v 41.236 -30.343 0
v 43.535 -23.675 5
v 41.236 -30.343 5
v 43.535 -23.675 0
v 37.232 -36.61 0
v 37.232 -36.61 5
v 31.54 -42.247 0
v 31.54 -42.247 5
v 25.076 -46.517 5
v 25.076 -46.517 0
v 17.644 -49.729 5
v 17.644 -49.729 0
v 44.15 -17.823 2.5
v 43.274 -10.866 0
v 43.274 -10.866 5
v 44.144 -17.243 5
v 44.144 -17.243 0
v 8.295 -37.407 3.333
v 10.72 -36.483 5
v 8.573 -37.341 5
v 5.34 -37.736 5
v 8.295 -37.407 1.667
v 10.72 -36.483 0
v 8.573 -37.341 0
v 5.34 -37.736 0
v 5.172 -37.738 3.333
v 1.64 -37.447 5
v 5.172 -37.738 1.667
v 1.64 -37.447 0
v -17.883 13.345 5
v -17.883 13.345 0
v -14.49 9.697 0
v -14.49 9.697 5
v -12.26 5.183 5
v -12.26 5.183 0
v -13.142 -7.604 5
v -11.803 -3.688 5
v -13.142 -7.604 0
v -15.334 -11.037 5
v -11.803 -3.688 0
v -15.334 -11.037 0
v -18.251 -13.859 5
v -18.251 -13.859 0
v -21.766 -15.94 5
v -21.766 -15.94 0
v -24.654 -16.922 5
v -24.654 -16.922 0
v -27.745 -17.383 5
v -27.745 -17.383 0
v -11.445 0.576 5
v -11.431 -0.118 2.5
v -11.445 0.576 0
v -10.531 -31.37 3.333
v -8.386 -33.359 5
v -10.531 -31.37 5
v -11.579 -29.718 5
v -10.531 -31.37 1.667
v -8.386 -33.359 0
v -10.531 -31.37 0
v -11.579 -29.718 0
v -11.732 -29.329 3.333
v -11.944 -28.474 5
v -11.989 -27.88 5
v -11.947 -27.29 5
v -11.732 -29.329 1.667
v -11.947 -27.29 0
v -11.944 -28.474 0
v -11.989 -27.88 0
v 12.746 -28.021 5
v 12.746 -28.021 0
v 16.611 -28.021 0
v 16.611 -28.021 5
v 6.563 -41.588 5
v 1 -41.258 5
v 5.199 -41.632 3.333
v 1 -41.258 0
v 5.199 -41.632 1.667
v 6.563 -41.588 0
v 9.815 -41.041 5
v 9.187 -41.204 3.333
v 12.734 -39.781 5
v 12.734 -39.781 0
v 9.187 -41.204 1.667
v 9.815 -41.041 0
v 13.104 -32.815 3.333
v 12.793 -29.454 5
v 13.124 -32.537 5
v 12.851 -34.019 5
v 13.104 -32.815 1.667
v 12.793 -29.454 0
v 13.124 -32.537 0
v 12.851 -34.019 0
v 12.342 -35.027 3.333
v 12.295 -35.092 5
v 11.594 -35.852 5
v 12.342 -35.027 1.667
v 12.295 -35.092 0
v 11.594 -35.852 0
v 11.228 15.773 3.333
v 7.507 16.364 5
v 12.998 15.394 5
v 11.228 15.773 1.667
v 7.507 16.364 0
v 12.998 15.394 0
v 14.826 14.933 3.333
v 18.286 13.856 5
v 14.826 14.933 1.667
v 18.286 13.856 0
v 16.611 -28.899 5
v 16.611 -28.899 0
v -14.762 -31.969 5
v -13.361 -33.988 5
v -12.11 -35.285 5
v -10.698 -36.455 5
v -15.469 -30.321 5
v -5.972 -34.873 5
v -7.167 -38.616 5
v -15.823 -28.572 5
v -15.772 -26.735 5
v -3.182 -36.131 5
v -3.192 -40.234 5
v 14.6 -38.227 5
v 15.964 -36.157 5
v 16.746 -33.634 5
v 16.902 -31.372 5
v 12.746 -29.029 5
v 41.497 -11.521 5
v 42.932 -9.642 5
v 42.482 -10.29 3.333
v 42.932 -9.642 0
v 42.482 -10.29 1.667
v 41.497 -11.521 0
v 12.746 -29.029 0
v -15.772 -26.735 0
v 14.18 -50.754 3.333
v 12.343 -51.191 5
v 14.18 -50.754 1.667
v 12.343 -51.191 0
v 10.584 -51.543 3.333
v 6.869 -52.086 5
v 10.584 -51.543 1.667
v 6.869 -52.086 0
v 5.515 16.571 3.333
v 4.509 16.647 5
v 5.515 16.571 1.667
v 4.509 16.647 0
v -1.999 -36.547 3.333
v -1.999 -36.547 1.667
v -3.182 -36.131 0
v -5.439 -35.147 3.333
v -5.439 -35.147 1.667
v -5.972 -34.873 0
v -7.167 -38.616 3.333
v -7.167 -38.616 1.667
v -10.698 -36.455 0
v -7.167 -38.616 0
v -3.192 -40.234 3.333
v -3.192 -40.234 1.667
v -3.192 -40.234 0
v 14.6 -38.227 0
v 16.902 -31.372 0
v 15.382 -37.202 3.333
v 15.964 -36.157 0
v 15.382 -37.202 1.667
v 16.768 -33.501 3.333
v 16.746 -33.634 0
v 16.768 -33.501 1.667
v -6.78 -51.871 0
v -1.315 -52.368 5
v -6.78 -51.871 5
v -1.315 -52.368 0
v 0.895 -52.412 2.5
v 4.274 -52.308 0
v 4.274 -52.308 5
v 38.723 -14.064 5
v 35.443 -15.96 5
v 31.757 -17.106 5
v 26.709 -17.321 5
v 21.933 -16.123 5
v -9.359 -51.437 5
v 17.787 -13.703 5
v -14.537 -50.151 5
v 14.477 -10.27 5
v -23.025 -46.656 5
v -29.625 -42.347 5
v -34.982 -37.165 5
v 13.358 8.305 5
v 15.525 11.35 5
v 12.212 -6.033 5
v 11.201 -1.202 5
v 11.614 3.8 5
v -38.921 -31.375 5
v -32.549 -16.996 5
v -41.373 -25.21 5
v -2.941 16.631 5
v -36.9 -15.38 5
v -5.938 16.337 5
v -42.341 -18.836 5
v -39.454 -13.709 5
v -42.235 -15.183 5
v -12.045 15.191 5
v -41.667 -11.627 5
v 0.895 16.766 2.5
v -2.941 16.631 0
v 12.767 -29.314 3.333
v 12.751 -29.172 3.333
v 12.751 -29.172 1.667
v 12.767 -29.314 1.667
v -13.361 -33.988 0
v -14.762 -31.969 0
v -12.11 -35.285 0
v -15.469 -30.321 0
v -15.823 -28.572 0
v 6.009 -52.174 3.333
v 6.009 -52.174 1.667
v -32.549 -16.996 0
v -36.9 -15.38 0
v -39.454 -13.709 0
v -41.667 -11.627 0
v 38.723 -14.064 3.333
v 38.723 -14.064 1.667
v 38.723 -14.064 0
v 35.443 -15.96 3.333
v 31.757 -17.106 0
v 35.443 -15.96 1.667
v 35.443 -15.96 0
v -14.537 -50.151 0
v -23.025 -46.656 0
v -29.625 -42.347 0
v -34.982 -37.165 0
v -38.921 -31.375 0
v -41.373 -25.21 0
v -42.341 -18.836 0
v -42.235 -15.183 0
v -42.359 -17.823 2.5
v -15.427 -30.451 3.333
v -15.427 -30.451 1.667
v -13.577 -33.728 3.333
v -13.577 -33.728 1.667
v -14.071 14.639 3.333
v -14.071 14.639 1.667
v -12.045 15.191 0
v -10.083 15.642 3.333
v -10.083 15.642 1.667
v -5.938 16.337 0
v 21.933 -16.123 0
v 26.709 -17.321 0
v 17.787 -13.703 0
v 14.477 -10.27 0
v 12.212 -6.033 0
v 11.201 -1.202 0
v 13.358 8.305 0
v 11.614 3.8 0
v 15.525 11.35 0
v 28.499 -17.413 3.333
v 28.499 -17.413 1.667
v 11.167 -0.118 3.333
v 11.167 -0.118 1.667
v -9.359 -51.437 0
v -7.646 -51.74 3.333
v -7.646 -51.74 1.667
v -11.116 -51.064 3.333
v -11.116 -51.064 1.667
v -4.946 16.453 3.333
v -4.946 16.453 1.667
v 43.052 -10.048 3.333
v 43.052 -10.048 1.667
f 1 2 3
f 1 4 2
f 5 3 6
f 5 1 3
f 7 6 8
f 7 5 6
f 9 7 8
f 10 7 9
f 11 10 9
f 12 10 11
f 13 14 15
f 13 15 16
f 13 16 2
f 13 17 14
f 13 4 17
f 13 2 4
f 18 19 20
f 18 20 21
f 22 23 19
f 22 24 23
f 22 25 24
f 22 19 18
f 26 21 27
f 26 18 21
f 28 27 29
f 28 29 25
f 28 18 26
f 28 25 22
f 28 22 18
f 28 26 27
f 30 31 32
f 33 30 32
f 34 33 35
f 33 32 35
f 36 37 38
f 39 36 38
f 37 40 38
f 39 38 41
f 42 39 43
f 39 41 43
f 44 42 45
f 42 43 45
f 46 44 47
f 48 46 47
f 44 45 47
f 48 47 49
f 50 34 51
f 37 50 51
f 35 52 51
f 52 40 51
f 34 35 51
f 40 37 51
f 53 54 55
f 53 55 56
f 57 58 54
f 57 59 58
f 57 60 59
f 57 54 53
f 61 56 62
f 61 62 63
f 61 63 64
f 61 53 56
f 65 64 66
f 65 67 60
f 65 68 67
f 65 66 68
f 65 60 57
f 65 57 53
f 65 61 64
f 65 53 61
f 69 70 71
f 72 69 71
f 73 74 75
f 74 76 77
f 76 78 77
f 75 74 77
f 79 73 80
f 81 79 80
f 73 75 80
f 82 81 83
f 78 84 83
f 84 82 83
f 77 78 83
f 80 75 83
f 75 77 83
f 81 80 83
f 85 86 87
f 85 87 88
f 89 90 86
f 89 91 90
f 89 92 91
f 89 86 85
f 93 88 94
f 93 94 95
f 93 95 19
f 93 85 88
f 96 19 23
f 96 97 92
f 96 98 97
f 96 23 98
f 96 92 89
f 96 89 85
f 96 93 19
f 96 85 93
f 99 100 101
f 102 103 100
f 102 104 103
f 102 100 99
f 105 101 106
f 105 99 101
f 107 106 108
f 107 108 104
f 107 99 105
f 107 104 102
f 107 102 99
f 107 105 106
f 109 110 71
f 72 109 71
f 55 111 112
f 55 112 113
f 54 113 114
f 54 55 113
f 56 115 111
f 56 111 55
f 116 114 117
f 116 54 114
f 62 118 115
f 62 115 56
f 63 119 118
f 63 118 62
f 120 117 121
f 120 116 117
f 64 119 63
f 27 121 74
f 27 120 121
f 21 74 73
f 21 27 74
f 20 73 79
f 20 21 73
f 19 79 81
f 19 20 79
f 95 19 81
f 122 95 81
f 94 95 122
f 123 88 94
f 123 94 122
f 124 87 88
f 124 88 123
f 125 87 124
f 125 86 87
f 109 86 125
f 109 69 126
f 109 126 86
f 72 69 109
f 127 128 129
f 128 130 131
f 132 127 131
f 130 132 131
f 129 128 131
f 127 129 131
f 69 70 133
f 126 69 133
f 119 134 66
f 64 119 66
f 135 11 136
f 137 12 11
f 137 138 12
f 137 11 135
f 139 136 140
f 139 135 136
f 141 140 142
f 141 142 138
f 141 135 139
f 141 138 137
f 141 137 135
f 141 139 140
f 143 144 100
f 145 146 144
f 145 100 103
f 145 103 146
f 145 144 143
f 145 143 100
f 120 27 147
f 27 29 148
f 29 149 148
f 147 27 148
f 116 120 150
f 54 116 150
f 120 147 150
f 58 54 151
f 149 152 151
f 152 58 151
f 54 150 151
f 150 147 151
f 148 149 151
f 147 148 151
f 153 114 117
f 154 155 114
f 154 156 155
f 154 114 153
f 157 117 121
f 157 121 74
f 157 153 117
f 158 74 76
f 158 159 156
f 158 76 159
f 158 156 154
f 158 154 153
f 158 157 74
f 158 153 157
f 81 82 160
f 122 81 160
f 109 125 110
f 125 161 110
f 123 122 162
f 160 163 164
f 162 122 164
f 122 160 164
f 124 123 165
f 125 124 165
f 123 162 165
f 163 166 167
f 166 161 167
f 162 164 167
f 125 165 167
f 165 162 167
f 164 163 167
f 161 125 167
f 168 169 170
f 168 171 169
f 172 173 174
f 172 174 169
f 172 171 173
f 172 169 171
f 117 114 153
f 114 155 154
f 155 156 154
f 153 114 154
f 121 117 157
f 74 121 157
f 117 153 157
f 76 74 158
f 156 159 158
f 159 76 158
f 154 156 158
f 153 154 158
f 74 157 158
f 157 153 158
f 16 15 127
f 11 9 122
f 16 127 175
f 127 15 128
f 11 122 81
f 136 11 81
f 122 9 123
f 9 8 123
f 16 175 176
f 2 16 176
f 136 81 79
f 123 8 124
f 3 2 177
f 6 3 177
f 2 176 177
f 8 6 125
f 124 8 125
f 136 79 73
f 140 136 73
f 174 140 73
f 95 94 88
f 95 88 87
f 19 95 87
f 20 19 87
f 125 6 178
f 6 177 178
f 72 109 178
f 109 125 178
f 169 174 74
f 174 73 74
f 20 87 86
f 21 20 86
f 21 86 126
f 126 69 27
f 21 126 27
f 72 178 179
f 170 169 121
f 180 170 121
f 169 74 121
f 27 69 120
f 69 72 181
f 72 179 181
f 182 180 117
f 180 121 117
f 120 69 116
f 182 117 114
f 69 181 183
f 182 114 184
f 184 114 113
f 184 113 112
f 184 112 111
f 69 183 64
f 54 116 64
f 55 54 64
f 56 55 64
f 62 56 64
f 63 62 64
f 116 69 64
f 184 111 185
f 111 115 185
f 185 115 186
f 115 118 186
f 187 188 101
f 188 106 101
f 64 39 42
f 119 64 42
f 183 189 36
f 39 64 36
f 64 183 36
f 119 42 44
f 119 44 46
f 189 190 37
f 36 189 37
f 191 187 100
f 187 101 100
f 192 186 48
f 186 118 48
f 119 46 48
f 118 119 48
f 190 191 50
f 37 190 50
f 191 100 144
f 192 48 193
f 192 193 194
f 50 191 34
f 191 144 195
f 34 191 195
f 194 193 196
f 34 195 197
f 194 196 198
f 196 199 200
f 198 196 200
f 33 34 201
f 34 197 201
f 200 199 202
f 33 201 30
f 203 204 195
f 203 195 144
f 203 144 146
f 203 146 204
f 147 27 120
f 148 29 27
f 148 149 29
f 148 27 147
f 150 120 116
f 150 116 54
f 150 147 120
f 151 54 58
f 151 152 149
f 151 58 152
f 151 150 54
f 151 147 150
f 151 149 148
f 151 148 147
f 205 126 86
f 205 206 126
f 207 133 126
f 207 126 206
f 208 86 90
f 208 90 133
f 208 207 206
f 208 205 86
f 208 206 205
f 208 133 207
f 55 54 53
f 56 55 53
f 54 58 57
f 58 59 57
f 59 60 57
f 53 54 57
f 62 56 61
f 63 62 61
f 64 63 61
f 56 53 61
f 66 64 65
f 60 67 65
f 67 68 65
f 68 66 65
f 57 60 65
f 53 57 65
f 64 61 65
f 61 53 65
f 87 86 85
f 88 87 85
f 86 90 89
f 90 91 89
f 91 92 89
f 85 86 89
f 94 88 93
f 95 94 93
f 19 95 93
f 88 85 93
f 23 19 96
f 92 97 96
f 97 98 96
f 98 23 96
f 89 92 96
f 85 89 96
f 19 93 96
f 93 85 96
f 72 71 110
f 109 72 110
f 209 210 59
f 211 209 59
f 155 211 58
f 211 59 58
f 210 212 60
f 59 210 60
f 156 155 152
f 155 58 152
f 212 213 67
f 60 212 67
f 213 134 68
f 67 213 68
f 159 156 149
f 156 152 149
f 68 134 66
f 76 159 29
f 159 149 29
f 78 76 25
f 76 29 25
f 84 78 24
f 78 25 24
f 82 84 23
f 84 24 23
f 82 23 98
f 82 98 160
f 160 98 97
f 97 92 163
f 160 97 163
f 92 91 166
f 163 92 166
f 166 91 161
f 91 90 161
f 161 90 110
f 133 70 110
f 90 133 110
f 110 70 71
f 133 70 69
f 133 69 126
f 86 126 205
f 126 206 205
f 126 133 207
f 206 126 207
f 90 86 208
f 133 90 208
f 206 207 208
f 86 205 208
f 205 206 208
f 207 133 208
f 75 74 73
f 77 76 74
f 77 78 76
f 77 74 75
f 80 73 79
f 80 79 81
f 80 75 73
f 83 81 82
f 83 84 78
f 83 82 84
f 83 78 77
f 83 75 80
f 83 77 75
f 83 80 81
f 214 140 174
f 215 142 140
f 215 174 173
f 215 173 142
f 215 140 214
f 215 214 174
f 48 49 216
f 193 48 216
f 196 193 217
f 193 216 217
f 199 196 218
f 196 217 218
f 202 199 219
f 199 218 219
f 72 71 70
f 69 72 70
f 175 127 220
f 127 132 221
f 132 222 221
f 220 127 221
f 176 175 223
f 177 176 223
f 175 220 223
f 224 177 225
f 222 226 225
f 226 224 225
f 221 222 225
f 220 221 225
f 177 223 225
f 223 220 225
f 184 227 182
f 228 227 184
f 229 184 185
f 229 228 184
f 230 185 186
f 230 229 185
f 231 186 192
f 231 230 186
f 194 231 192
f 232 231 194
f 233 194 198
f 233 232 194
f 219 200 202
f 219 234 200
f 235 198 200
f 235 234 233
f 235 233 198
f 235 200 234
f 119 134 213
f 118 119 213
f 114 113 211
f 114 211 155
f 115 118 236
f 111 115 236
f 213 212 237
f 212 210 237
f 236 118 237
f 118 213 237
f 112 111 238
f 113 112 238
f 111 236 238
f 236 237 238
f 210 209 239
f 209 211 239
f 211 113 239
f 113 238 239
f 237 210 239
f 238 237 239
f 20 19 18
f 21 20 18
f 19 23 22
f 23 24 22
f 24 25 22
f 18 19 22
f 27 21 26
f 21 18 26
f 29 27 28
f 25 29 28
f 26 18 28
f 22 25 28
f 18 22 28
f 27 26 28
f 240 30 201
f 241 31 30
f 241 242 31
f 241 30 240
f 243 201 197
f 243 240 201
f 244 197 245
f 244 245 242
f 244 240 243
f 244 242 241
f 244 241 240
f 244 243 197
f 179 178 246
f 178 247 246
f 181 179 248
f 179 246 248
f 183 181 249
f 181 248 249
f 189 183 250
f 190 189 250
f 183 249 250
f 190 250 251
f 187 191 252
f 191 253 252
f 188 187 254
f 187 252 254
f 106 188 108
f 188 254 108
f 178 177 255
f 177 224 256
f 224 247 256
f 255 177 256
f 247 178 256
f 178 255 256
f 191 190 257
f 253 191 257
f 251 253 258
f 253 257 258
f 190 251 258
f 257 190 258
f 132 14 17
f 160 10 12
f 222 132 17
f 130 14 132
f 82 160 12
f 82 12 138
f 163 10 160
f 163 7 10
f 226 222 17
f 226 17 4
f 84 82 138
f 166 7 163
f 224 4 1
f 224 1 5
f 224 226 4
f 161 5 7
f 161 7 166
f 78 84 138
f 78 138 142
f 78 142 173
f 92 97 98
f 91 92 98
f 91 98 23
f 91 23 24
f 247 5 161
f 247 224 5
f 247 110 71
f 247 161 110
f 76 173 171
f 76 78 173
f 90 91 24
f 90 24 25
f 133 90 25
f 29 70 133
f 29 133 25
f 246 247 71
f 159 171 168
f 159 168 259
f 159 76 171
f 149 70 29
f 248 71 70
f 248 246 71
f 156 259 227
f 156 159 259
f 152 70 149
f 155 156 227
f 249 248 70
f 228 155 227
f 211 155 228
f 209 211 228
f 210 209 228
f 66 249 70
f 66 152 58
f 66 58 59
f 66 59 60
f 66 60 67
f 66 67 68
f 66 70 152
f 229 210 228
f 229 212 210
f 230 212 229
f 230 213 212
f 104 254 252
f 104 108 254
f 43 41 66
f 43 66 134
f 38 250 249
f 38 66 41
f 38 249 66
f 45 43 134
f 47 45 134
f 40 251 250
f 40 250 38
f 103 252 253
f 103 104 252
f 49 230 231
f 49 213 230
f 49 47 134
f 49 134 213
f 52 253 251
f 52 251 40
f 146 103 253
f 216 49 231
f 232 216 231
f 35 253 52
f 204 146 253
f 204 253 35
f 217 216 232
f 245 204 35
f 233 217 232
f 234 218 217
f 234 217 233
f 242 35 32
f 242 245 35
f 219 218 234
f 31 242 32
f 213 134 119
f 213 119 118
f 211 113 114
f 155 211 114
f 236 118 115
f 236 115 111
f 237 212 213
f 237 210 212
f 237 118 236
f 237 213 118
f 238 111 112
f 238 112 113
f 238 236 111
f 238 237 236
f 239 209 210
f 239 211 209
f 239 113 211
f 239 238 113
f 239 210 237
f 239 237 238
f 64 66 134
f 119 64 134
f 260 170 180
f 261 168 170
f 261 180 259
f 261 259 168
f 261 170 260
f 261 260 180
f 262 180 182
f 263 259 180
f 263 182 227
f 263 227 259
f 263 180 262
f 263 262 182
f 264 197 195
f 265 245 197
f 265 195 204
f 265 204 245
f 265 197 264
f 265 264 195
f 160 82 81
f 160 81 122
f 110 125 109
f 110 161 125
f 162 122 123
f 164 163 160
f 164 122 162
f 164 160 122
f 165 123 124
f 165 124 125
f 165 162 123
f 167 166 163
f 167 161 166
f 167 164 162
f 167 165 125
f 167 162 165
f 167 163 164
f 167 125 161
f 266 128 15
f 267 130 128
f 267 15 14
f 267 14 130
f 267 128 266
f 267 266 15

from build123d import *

# Parameters (mm, degrees)
F1_DEPTH = 5
F2_DEPTH = 5


with BuildPart() as f1:
    # F0 (on Top) → F1 (new body)
    with BuildSketch(Plane.XY):
        with BuildLine():
            add(Edge.make_bspline(
                [(12.734443, -39.781365), (15.920232, -37.835476), (17.632841, -33.879291), (16.61114, -28.898724)],
                knots=[0, 0, 0, 0, 1, 1, 1, 1], degree=3))
            Line((16.61114, -28.898724), (16.61114, -28.020637))
            Line((16.61114, -28.020637), (12.746019, -28.020637))
            add(Edge.make_bspline(
                [(12.746019, -28.020637), (12.746019, -28.0208513466), (12.746019, -28.0210702537), (12.746019, -28.0378303299), (12.746019, -28.3570972405), (12.746019, -28.6929007595), (12.746019, -29.0121676701), (12.746019, -29.0289277463), (12.746019, -29.0291466534), (12.746019, -29.029361)],
                knots=[0, 0, 0, 0, 0.0006430397, 0.0006567214, 0.0502802287, 0.9584437713, 1.0080672786, 1.0080809603, 1.008724, 1.008724, 1.008724, 1.008724], degree=3))
            add(Edge.make_bspline(
                [(12.746019, -29.029361), (12.74605, -29.172341), (12.761948, -29.314876), (12.793421, -29.454349)],
                knots=[0, 0, 0, 0, 1, 1, 1, 1], degree=3))
            add(Edge.make_bspline(
                [(12.793421, -29.454349), (13.710785, -33.520561), (12.70048, -35.27361), (10.719751, -36.483446)],
                knots=[0, 0, 0, 0, 1, 1, 1, 1], degree=3))
            add(Edge.make_bspline(
                [(10.719751, -36.483446), (8.739023, -37.693279), (5.281256, -38.058505), (1.640132, -37.446969)],
                knots=[0, 0, 0, 0, 1, 1, 1, 1], degree=3))
            add(Edge.make_bspline(
                [(1.640132, -37.446969), (-2.000989, -36.835433), (-5.782567, -35.302924), (-8.385923, -33.358605)],
                knots=[0, 0, 0, 0, 1, 1, 1, 1], degree=3))
            add(Edge.make_bspline(
                [(-8.385923, -33.358605), (-10.989276, -31.414286), (-12.239972, -29.310328), (-11.946774, -27.289724)],
                knots=[0, 0, 0, 0, 1, 1, 1, 1], degree=3))
            Line((-11.946774, -27.289724), (-15.771656, -26.734652))
            add(Edge.make_bspline(
                [(-15.771656, -26.734652), (-16.337542, -30.634506), (-13.932498, -34.039847), (-10.698271, -36.455334)],
                knots=[0, 0, 0, 0, 1, 1, 1, 1], degree=3))
            add(Edge.make_bspline(
                [(-10.698271, -36.455334), (-7.464044, -38.870817), (-3.226178, -40.548244), (1.00017, -41.25807)],
                knots=[0, 0, 0, 0, 1, 1, 1, 1], degree=3))
            add(Edge.make_bspline(
                [(1.00017, -41.25807), (5.226522, -41.967898), (9.484578, -41.766392), (12.734443, -39.781365)],
                knots=[0, 0, 0, 0, 1, 1, 1, 1], degree=3))
        make_face()
    extrude(amount=F1_DEPTH)


with BuildPart() as f1b:
    # F0 (on Top) → F1, piece 2 (new body)
    with BuildSketch(Plane.XY):
        with BuildLine():
            add(Edge.make_bspline(
                [(-27.7454914934, -17.3831615798), (-25.4848622372, -19.2736486235), (-23.4287961137, -21.451514347), (-21.6284719984, -23.9119219826)],
                knots=[0.8661202793, 0.8661202793, 0.8661202793, 0.8661202793, 1, 1, 1, 1], degree=3))
            add(Edge.make_bspline(
                [(-27.7454914981, -17.3831615977), (-28.0822081964, -17.4027131688), (-28.4214851444, -17.412626), (-28.76305, -17.412626)],
                knots=[0.9642809302, 0.9642809302, 0.9642809302, 0.9642809302, 1, 1, 1, 1], degree=3))
            add(Edge.make_bspline(
                [(-28.7630500014, -17.4126260018), (-33.8960829139, -17.4126260018), (-38.5015979977, -15.1739896926), (-41.6668967581, -11.6268322113)],
                knots=[0, 0, 0, 0, 0.5367857347, 0.5367857347, 0.5367857347, 0.5367857347], degree=3))
            add(Edge.make_bspline(
                [(-42.3593879972, -17.8232599981), (-42.3593879972, -15.70835477), (-42.1218509095, -13.6374762635), (-41.6668967569, -11.6268322116)],
                knots=[0, 0, 0, 0, 0.1108003269, 0.1108003269, 0.1108003269, 0.1108003269], degree=3))
            add(Edge.make_bspline(
                [(-14.5369517464, -50.1506168986), (-30.8120747848, -45.1875138054), (-42.359388, -32.5977476883), (-42.359388, -17.82326)],
                knots=[0.2274692045, 0.2274692045, 0.2274692045, 0.2274692045, 1, 1, 1, 1], degree=3))
            add(Edge.make_bspline(
                [(-21.628472002, -23.9119220042), (-15.9783217735, -31.6281219583), (-13.7253066716, -40.8854651209), (-14.5369517491, -50.1506168989)],
                knots=[0, 0, 0, 0, 0.4190171031, 0.4190171031, 0.4190171031, 0.4190171031], degree=3))
        make_face()
    extrude(amount=F1_DEPTH)



with BuildPart() as f1c:
    # F0 (on Top) → F1, piece 3 (new body)
    with BuildSketch(Plane.XY):
        with BuildLine():
            add(Edge.make_bspline(
                [(41.496607571, -11.5207741803), (39.0096189113, -14.3537933789), (35.6115250768, -16.3700235375), (31.7572682547, -17.1057755436)],
                knots=[0.457889602, 0.457889602, 0.457889602, 0.457889602, 0.8834983945, 0.8834983945, 0.8834983945, 0.8834983945], degree=3))
            add(Edge.make_bspline(
                [(24.801034, -24.322837), (26.8241254465, -21.5600342644), (29.1667116086, -19.1520336904), (31.7572682547, -17.1057755436)],
                knots=[0, 0, 0, 0, 0.1500300155, 0.1500300155, 0.1500300155, 0.1500300155], degree=3))
            add(Edge.make_bspline(
                [(17.6440274537, -49.729019344), (17.0311754569, -40.7368621909), (19.3145165012, -31.800141131), (24.801034, -24.322837)],
                knots=[0.593126466, 0.593126466, 0.593126466, 0.593126466, 1, 1, 1, 1], degree=3))
            add(Edge.make_bspline(
                [(44.149908, -17.82326), (44.149908, -32.1960737794), (33.2217734232, -44.5013432134), (17.6440274514, -49.7290193437)],
                knots=[0, 0, 0, 0, 0.7515280054, 0.7515280054, 0.7515280054, 0.7515280054], degree=3))
            add(Edge.make_bspline(
                [(43.2741469204, -10.8659114346), (43.8483964355, -13.1136924153), (44.149908, -15.4405345256), (44.149908, -17.82326)],
                knots=[0.8751685145, 0.8751685145, 0.8751685145, 0.8751685145, 1, 1, 1, 1], degree=3))
            add(Edge.make_bspline(
                [(41.496607571, -11.5207741803), (42.0831921323, -11.2889186769), (42.6758725904, -11.0706148581), (43.2741469213, -10.8659114372)],
                knots=[0.3213713892, 0.3213713892, 0.3213713892, 0.3213713892, 0.3500969523, 0.3500969523, 0.3500969523, 0.3500969523], degree=3))
        make_face()
        with BuildLine():
            add(Edge.make_bspline(
                [(42.9322474575, -9.6419037564), (42.4962572948, -10.3010425075), (42.0163267182, -10.9287432049), (41.496607571, -11.5207741803)],
                knots=[0.3689478861, 0.3689478861, 0.3689478861, 0.3689478861, 0.457889602, 0.457889602, 0.457889602, 0.457889602], degree=3))
            add(Edge.make_bspline(
                [(41.496607571, -11.5207741803), (42.0831921323, -11.2889186769), (42.6758725904, -11.0706148581), (43.2741469213, -10.8659114372)],
                knots=[0.3213713892, 0.3213713892, 0.3213713892, 0.3213713892, 0.3500969523, 0.3500969523, 0.3500969523, 0.3500969523], degree=3))
            add(Edge.make_bspline(
                [(42.9322474577, -9.6419037563), (43.0552016039, -10.0471728179), (43.1692265907, -10.4552224997), (43.2741469204, -10.8659114346)],
                knots=[0.8523607274, 0.8523607274, 0.8523607274, 0.8523607274, 0.8751685145, 0.8751685145, 0.8751685145, 0.8751685145], degree=3))
        make_face()
    extrude(amount=F1_DEPTH)


with BuildPart() as f1b_1:
    add(f1b.part)

    add(f1c.part)  # F2 merges F1c
    # F0 (on Top) → F2 (join)
    with BuildSketch(Plane.XY):
        with BuildLine():
            add(Edge.make_bspline(
                [(-5.9378795005, 16.3365863681), (-4.9497466604, 16.4619585653), (-3.9504295333, 16.560578393), (-2.9411196849, 16.6314859824)],
                knots=[0.9027302545, 0.9027302545, 0.9027302545, 0.9027302545, 0.9459190297, 0.9459190297, 0.9459190297, 0.9459190297], degree=3))
            add(Edge.make_bspline(
                [(-17.8832007592, 13.3451160525), (-14.1667628508, 14.7796245747), (-10.1541337023, 15.8016369849), (-5.9378795005, 16.3365863681)],
                knots=[0.7184484983, 0.7184484983, 0.7184484983, 0.7184484983, 0.9027302545, 0.9027302545, 0.9027302545, 0.9027302545], degree=3))
            add(Edge.make_bspline(
                [(-17.8832007591, 13.3451160522), (-13.9495167672, 10.1766095439), (-11.431219, 5.3257917383), (-11.431219, -0.118331)],
                knots=[0.4306821184, 0.4306821184, 0.4306821184, 0.4306821184, 1, 1, 1, 1], degree=3))
            add(Edge.make_bspline(
                [(-11.431219, -0.118331), (-11.431219, -9.3028339682), (-18.6554034185, -16.855342504), (-27.7454914981, -17.3831615977)],
                knots=[0, 0, 0, 0, 0.9642809302, 0.9642809302, 0.9642809302, 0.9642809302], degree=3))
            add(Edge.make_bspline(
                [(-27.7454914934, -17.3831615798), (-25.4848622372, -19.2736486235), (-23.4287961137, -21.451514347), (-21.6284719984, -23.9119219826)],
                knots=[0.8661202793, 0.8661202793, 0.8661202793, 0.8661202793, 1, 1, 1, 1], degree=3))
            add(Edge.make_bspline(
                [(-21.628472002, -23.9119220042), (-15.9783217735, -31.6281219583), (-13.7253066716, -40.8854651209), (-14.5369517491, -50.1506168989)],
                knots=[0, 0, 0, 0, 0.4190171031, 0.4190171031, 0.4190171031, 0.4190171031], degree=3))
            add(Edge.make_bspline(
                [(-9.358816, -51.4367196264), (-11.1301489273, -51.0930942082), (-12.8586867056, -50.6624042685), (-14.5369517464, -50.1506168986)],
                knots=[0.1478070462, 0.1478070462, 0.1478070462, 0.1478070462, 0.2274692045, 0.2274692045, 0.2274692045, 0.2274692045], degree=3))
            add(Edge.make_bspline(
                [(-6.77968, -51.8706532523), (-7.6486983636, -51.7465029707), (-8.5086859107, -51.6016385431), (-9.358816, -51.4367196264)],
                knots=[0.1095741445, 0.1095741445, 0.1095741445, 0.1095741445, 0.1478070462, 0.1478070462, 0.1478070462, 0.1478070462], degree=3))
            add(Edge.make_bspline(
                [(0.895119, -52.412133), (-1.7243512939, -52.412133), (-4.2891040964, -52.2264635695), (-6.77968, -51.8706532523)],
                knots=[0, 0, 0, 0, 0.1095741445, 0.1095741445, 0.1095741445, 0.1095741445], degree=3))
            add(Edge.make_bspline(
                [(4.274391, -52.3084107676), (3.1593420107, -52.3771353208), (2.032387159, -52.412133), (0.895119, -52.412133)],
                knots=[0.9524273319, 0.9524273319, 0.9524273319, 0.9524273319, 1, 1, 1, 1], degree=3))
            add(Edge.make_bspline(
                [(6.8688456197, -52.0857892042), (6.0118230737, -52.1802340142), (5.1467506657, -52.2546440462), (4.274391, -52.3084107676)],
                knots=[0.9152088086, 0.9152088086, 0.9152088086, 0.9152088086, 0.9524273319, 0.9524273319, 0.9524273319, 0.9524273319], degree=3))
            add(Edge.make_bspline(
                [(17.6440274514, -49.7290193437), (14.2512357594, -50.8675933181), (10.6378865758, -51.670436821), (6.8688456197, -52.0857892042)],
                knots=[0.7515280054, 0.7515280054, 0.7515280054, 0.7515280054, 0.9152088086, 0.9152088086, 0.9152088086, 0.9152088086], degree=3))
            add(Edge.make_bspline(
                [(17.6440274537, -49.729019344), (17.0311754569, -40.7368621909), (19.3145165012, -31.800141131), (24.801034, -24.322837)],
                knots=[0.593126466, 0.593126466, 0.593126466, 0.593126466, 1, 1, 1, 1], degree=3))
            add(Edge.make_bspline(
                [(24.801034, -24.322837), (26.8241254465, -21.5600342644), (29.1667116086, -19.1520336904), (31.7572682547, -17.1057755436)],
                knots=[0, 0, 0, 0, 0.1500300155, 0.1500300155, 0.1500300155, 0.1500300155], degree=3))
            add(Edge.make_bspline(
                [(31.7572682547, -17.1057755436), (30.7022451548, -17.30717244), (29.6130427928, -17.4126260015), (28.4989919964, -17.4126260015)],
                knots=[0.8834983945, 0.8834983945, 0.8834983945, 0.8834983945, 1, 1, 1, 1], degree=3))
            add(Edge.make_bspline(
                [(28.498992, -17.412626), (18.936739, -17.412626), (11.167443, -9.643331), (11.167443, -0.118331)],
                knots=[0, 0, 0, 0, 1, 1, 1, 1], degree=3))
            add(Edge.make_bspline(
                [(11.1674430006, -0.1183309997), (11.1674430006, 5.627639161), (13.9726326914, 10.7126893493), (18.2864119041, 13.856445722)],
                knots=[0, 0, 0, 0, 0.6008835063, 0.6008835063, 0.6008835063, 0.6008835063], degree=3))
            add(Edge.make_bspline(
                [(7.5071641473, 16.3641522212), (11.2838455632, 15.9010039293), (14.8989934452, 15.0473276915), (18.2864119041, 13.8564457219)],
                knots=[0.0940532477, 0.0940532477, 0.0940532477, 0.0940532477, 0.25884533, 0.25884533, 0.25884533, 0.25884533], degree=3))
            add(Edge.make_bspline(
                [(4.5089480455, 16.6466515848), (5.5186328345, 16.5798891894), (6.5184341258, 16.4854038096), (7.5071641473, 16.3641522212)],
                knots=[0.0509109063, 0.0509109063, 0.0509109063, 0.0509109063, 0.0940532477, 0.0940532477, 0.0940532477, 0.0940532477], degree=3))
            add(Edge.make_bspline(
                [(0.895119, 16.765614), (2.112190798, 16.765614), (3.3174511085, 16.7254357662), (4.5089480455, 16.6466515848)],
                knots=[0, 0, 0, 0, 0.0509109063, 0.0509109063, 0.0509109063, 0.0509109063], degree=3))
            add(Edge.make_bspline(
                [(-2.9411196849, 16.6314859824), (-1.6772622212, 16.7202764427), (-0.3977361304, 16.7656140019), (0.8951190028, 16.7656140019)],
                knots=[0.9459190297, 0.9459190297, 0.9459190297, 0.9459190297, 1, 1, 1, 1], degree=3))
        make_face()
        with BuildLine():
            Line((16.61114, -28.020637), (16.61114, -28.898724))
            add(Edge.make_bspline(
                [(12.734443, -39.781365), (15.920232, -37.835476), (17.632841, -33.879291), (16.61114, -28.898724)],
                knots=[0, 0, 0, 0, 1, 1, 1, 1], degree=3))
            add(Edge.make_bspline(
                [(1.00017, -41.25807), (5.226522, -41.967898), (9.484578, -41.766392), (12.734443, -39.781365)],
                knots=[0, 0, 0, 0, 1, 1, 1, 1], degree=3))
            add(Edge.make_bspline(
                [(-10.698271, -36.455334), (-7.464044, -38.870817), (-3.226178, -40.548244), (1.00017, -41.25807)],
                knots=[0, 0, 0, 0, 1, 1, 1, 1], degree=3))
            add(Edge.make_bspline(
                [(-15.771656, -26.734652), (-16.337542, -30.634506), (-13.932498, -34.039847), (-10.698271, -36.455334)],
                knots=[0, 0, 0, 0, 1, 1, 1, 1], degree=3))
            Line((-15.771656, -26.734652), (-11.946774, -27.289724))
            add(Edge.make_bspline(
                [(-8.385923, -33.358605), (-10.989276, -31.414286), (-12.239972, -29.310328), (-11.946774, -27.289724)],
                knots=[0, 0, 0, 0, 1, 1, 1, 1], degree=3))
            add(Edge.make_bspline(
                [(1.640132, -37.446969), (-2.000989, -36.835433), (-5.782567, -35.302924), (-8.385923, -33.358605)],
                knots=[0, 0, 0, 0, 1, 1, 1, 1], degree=3))
            add(Edge.make_bspline(
                [(10.719751, -36.483446), (8.739023, -37.693279), (5.281256, -38.058505), (1.640132, -37.446969)],
                knots=[0, 0, 0, 0, 1, 1, 1, 1], degree=3))
            add(Edge.make_bspline(
                [(12.793421, -29.454349), (13.710785, -33.520561), (12.70048, -35.27361), (10.719751, -36.483446)],
                knots=[0, 0, 0, 0, 1, 1, 1, 1], degree=3))
            add(Edge.make_bspline(
                [(12.746019, -29.029361), (12.74605, -29.172341), (12.761948, -29.314876), (12.793421, -29.454349)],
                knots=[0, 0, 0, 0, 1, 1, 1, 1], degree=3))
            add(Edge.make_bspline(
                [(12.746019, -28.020637), (12.746019, -28.0208513466), (12.746019, -28.0210702537), (12.746019, -28.0378303299), (12.746019, -28.3570972405), (12.746019, -28.6929007595), (12.746019, -29.0121676701), (12.746019, -29.0289277463), (12.746019, -29.0291466534), (12.746019, -29.029361)],
                knots=[0, 0, 0, 0, 0.0006430397, 0.0006567214, 0.0502802287, 0.9584437713, 1.0080672786, 1.0080809603, 1.008724, 1.008724, 1.008724, 1.008724], degree=3))
            Line((12.746019, -28.020637), (16.61114, -28.020637))
        make_face(mode=Mode.SUBTRACT)
    extrude(amount=F2_DEPTH)


solid = Compound([f1.part, f1b_1.part])
